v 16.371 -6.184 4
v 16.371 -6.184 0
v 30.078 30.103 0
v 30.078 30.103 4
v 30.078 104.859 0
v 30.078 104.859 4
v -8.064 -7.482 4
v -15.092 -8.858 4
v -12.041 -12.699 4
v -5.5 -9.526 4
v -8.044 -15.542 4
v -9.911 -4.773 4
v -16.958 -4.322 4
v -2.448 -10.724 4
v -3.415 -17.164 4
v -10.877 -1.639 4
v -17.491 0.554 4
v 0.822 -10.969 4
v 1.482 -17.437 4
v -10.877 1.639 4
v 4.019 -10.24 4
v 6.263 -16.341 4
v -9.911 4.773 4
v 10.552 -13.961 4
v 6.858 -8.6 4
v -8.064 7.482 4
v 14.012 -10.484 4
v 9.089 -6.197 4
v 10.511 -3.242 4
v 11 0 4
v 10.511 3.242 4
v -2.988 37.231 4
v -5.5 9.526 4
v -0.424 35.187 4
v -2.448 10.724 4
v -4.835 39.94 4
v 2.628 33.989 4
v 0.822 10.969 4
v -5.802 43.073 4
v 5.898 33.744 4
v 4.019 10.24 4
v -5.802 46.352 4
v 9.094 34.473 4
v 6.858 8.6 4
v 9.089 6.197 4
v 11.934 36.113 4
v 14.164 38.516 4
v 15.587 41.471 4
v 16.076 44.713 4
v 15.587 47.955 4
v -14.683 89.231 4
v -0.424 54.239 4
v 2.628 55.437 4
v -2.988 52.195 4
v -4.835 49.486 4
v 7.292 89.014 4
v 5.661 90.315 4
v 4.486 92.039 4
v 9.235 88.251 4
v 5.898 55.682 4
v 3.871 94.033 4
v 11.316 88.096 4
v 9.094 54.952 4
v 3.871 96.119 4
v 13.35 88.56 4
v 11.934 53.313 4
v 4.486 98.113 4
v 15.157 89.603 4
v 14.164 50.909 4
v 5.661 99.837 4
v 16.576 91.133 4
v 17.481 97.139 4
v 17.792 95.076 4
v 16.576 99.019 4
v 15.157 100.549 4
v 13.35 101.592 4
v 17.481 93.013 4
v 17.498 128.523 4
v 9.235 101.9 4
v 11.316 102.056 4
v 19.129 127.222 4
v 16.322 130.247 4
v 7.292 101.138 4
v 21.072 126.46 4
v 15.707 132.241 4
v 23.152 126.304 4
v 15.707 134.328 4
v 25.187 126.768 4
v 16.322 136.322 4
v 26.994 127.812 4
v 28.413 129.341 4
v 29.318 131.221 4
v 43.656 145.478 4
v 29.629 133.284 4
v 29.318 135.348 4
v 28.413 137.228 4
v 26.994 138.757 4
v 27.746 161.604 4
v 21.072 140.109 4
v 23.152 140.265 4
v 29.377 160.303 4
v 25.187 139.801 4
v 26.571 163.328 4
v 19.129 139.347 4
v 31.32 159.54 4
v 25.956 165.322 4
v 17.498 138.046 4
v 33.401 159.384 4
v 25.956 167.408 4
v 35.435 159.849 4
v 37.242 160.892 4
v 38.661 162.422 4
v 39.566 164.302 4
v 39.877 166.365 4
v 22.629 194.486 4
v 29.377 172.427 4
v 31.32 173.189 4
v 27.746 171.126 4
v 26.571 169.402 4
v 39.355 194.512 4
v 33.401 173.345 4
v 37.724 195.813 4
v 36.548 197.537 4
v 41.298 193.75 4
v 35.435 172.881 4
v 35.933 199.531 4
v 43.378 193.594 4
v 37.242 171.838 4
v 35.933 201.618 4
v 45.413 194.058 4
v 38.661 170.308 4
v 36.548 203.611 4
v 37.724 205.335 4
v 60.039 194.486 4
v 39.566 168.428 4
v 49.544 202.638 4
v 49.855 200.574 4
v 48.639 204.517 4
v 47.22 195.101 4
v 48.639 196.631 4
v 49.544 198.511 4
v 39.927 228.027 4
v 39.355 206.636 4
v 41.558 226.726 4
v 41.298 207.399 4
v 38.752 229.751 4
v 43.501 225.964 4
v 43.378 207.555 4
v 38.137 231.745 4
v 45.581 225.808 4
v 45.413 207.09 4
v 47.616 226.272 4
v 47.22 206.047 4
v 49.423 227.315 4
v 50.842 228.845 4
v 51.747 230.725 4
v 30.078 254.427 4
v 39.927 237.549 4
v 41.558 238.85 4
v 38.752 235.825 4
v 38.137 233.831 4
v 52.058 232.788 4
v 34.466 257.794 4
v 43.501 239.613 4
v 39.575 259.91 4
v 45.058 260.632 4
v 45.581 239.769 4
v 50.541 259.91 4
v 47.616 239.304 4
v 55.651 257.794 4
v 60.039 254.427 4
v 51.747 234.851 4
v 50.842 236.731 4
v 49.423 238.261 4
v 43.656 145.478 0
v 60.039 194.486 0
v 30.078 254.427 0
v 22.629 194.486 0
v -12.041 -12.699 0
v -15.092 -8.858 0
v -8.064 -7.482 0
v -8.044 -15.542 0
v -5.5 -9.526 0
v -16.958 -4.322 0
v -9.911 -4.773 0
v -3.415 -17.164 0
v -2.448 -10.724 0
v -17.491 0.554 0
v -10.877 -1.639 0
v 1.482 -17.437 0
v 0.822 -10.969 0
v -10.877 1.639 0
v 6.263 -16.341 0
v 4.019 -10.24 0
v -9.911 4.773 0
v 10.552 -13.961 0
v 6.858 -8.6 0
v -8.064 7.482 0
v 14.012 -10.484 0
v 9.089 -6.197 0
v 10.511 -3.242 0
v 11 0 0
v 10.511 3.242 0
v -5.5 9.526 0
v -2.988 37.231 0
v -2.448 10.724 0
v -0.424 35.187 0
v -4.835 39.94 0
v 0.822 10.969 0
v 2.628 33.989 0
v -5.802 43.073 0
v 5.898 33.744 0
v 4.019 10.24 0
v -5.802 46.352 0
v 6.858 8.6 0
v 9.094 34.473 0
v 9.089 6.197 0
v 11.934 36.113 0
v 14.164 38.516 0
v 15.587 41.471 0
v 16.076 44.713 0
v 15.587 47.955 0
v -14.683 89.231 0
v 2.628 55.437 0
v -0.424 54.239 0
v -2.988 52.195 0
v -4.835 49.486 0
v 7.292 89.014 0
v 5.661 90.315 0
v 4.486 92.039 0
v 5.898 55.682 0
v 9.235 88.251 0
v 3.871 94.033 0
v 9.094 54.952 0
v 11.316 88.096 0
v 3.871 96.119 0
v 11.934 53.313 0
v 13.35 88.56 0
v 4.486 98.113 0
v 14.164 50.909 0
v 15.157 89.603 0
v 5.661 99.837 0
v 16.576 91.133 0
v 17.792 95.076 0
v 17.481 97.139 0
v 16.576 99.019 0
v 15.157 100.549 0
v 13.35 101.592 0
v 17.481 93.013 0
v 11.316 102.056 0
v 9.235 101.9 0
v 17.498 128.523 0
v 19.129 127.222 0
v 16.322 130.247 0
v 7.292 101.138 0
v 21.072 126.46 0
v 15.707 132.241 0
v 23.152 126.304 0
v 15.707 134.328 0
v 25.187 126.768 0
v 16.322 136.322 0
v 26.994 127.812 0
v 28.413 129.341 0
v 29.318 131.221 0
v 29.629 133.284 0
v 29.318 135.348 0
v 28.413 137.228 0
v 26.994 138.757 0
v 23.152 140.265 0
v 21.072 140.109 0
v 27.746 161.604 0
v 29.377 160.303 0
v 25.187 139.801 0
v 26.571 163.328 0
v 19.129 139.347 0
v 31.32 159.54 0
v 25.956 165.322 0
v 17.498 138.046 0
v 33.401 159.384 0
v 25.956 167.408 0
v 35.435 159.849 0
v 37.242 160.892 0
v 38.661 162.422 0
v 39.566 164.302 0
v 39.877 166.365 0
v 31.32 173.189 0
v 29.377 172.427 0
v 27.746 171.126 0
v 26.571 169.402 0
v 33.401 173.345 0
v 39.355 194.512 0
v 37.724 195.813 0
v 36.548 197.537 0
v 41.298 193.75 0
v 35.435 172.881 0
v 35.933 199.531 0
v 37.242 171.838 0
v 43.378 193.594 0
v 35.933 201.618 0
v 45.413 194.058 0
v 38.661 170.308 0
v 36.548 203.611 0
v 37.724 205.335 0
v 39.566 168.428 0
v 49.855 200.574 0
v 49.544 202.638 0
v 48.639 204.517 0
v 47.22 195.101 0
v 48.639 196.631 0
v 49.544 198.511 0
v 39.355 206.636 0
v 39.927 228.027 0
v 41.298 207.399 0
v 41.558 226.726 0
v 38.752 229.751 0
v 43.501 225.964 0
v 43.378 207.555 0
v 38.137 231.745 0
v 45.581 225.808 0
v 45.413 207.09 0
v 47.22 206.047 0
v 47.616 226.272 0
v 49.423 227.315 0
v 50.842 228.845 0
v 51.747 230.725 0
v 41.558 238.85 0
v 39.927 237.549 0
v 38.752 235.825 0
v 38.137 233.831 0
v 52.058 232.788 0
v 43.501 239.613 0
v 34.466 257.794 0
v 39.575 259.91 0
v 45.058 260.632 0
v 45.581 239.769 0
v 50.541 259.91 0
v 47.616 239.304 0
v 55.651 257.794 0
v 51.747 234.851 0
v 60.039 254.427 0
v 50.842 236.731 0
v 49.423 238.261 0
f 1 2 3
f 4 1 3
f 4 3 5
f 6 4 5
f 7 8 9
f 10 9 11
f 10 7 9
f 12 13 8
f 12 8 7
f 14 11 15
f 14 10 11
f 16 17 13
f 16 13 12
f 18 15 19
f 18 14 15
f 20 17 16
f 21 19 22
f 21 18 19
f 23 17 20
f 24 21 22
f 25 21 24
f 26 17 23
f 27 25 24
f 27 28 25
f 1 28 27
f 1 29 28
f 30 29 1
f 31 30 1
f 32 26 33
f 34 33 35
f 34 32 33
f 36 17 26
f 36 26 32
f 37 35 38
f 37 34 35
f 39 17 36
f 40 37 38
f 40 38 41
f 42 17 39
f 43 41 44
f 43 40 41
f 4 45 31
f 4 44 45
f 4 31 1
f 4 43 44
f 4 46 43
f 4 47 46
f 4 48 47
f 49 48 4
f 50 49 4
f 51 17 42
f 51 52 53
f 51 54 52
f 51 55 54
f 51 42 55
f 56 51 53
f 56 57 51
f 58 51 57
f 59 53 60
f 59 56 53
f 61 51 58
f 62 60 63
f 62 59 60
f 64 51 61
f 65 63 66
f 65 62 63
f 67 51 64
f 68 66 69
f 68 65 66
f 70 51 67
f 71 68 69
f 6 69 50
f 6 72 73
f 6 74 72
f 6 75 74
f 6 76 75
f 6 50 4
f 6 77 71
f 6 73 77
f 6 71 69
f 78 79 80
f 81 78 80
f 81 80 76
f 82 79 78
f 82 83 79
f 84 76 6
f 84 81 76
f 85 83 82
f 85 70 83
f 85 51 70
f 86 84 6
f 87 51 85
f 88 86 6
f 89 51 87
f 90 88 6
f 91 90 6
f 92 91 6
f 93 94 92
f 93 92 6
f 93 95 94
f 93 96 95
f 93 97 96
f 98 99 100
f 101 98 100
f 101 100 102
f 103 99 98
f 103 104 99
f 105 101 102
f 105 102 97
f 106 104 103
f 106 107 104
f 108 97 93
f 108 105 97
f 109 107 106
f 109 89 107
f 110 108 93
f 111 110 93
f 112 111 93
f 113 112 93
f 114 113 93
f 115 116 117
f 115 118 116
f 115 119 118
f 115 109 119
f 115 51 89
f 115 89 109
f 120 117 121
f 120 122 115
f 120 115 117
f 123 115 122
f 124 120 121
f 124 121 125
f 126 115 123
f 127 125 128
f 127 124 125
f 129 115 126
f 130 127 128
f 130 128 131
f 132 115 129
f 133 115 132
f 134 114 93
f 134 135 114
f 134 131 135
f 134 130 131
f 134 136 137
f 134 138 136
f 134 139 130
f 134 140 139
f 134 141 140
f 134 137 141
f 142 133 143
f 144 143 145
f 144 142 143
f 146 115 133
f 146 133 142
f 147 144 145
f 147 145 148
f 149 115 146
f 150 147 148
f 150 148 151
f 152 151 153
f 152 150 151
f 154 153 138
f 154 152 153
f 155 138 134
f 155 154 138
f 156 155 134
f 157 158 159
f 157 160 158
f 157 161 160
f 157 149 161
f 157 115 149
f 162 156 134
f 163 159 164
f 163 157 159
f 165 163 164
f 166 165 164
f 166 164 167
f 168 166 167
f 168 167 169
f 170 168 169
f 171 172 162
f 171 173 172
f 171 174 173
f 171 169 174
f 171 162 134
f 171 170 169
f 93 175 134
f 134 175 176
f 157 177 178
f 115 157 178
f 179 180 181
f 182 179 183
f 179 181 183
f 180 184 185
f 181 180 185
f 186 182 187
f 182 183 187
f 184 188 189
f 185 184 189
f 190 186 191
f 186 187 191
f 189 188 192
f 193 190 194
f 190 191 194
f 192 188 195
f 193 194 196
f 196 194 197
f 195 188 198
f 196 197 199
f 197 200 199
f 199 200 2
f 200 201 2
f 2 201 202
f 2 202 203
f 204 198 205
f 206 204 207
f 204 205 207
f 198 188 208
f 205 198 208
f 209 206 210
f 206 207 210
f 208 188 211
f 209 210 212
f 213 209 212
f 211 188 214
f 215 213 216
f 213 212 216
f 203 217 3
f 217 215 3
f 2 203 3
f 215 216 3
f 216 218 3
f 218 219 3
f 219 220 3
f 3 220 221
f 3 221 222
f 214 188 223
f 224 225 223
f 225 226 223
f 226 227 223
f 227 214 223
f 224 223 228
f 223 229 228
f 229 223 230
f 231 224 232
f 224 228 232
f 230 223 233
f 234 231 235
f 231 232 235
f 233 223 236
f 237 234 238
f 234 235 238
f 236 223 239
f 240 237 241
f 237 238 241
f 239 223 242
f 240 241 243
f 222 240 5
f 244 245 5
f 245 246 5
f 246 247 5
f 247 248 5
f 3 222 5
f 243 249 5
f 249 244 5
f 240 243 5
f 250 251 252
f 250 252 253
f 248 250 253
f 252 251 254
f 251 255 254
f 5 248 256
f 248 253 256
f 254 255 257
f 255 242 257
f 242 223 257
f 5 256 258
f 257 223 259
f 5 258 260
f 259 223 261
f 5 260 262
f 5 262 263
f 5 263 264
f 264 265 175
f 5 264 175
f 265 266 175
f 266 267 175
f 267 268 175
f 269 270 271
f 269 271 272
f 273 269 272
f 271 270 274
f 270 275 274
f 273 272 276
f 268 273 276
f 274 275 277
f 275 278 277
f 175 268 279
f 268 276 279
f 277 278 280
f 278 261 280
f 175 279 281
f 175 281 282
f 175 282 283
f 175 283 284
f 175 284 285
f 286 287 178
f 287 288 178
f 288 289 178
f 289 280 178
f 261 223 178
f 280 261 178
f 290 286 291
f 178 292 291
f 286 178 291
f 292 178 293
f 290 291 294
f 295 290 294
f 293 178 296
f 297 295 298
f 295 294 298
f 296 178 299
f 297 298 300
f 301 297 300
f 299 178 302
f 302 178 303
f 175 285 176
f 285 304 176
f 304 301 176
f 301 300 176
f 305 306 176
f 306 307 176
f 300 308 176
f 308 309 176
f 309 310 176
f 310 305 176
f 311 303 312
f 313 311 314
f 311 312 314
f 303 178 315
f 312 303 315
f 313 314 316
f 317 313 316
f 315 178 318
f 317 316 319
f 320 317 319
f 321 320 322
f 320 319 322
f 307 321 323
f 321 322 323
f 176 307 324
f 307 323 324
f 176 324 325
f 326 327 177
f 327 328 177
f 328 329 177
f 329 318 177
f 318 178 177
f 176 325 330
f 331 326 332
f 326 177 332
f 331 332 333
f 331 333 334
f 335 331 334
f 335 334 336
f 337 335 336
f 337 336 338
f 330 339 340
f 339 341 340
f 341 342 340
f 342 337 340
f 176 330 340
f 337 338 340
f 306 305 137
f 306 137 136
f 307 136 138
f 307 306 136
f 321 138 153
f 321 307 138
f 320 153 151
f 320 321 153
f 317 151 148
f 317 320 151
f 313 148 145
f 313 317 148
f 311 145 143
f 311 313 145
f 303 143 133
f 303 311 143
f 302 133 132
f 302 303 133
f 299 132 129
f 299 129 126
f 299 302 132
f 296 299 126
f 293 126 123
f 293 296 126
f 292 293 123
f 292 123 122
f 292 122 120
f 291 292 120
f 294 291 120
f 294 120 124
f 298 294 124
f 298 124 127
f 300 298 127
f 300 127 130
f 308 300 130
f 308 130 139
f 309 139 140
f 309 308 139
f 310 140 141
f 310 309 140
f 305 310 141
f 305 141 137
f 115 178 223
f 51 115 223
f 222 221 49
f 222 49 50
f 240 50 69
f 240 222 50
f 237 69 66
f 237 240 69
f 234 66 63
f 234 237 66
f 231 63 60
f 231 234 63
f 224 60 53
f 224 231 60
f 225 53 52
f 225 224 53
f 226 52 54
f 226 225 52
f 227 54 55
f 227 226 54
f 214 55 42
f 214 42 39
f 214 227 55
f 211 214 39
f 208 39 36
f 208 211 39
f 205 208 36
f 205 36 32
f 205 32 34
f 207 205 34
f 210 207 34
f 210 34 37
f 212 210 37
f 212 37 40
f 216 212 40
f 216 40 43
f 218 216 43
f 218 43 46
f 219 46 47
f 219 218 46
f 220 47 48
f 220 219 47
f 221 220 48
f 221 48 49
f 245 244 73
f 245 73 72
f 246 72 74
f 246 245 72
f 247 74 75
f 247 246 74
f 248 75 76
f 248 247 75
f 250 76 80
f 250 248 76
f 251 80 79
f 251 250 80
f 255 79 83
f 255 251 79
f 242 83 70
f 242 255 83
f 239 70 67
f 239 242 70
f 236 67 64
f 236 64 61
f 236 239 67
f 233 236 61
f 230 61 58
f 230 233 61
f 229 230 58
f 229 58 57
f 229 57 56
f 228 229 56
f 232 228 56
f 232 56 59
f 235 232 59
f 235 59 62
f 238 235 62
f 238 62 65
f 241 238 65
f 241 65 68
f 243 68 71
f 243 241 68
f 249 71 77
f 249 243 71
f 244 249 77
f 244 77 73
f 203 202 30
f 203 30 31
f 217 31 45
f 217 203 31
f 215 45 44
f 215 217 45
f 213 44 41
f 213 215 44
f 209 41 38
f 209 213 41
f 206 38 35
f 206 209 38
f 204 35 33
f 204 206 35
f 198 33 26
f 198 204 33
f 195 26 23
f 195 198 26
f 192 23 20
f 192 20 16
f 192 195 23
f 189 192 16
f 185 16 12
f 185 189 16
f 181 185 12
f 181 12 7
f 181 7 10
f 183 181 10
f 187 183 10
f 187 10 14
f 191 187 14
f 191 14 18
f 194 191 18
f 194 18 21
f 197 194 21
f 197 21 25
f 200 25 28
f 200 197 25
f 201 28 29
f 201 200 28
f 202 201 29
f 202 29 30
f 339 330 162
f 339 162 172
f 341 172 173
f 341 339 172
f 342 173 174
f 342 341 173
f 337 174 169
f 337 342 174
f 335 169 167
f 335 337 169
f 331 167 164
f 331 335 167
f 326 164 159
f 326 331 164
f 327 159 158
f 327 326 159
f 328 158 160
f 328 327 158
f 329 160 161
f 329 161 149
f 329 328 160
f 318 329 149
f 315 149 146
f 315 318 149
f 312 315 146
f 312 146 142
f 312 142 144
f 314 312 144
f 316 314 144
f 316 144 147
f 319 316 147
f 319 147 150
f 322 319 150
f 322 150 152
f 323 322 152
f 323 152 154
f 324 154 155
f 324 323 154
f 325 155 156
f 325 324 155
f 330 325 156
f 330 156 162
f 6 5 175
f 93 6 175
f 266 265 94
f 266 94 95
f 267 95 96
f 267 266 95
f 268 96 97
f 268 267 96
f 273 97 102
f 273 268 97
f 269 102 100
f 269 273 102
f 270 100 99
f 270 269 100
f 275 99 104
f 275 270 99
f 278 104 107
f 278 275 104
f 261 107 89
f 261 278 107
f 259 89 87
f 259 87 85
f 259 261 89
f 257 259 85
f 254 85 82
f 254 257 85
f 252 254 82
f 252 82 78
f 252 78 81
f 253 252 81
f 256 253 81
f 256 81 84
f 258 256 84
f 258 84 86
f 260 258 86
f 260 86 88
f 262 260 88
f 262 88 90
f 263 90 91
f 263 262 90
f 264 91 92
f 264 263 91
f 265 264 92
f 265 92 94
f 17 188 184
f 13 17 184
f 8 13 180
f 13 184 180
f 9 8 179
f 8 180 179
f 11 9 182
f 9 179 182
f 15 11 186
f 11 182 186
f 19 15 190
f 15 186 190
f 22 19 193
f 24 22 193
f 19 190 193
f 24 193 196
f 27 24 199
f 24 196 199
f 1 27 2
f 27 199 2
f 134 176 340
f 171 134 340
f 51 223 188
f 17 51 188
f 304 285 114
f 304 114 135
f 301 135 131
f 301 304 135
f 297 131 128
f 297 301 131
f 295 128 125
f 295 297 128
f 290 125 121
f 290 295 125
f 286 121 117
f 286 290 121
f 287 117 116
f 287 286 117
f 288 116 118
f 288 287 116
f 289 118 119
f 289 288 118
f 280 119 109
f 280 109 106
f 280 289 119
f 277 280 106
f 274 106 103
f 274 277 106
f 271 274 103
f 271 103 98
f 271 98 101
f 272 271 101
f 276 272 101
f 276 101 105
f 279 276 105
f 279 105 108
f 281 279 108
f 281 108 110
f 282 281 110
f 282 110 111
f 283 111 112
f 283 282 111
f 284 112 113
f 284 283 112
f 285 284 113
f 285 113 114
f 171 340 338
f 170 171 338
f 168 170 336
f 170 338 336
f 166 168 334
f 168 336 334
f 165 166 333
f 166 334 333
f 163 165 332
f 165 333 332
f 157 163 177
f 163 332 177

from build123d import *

# Parameters (mm, degrees)
SKETCH2_R           = 11
SKETCH2_R_2         = 7
BOSS_EXTRUDE1_DEPTH = 4


with BuildPart() as part:
    # Sketch2 → Boss-Extrude1 (new body)
    with BuildSketch(Plane.XY):
        with BuildLine():
            Line((30.078103468, 30.102899094), (30.078103468, 104.858637586))
            Line((30.078103468, 104.858637586), (43.656234688, 145.478166756))
            Line((43.656234688, 145.478166756), (60.038536544, 194.486485935))
            Line((60.038536544, 194.486485935), (60.038536544, 254.427096014))
            ThreePointArc((60.038536544, 254.427096014), (45.05832001, 260.632104877), (30.078103469, 254.427096029))
            Line((30.078103469, 254.427096029), (22.62926434, 194.486485916))
            Line((22.62926434, 194.486485916), (-14.683335653, 89.230795609))
            Line((-14.683335653, 89.230795609), (-17.49123357, 0.553848547))
            ThreePointArc((-17.49123357, 0.553848547), (-3.415184823, -17.163522734), (16.370945819, -6.184022397))
            Line((16.370945819, -6.184022397), (30.078103468, 30.102899094))
        make_face()
        Circle(SKETCH2_R, mode=Mode.SUBTRACT)
        with Locations((45.058319997, 232.788133995)):
            Circle(SKETCH2_R_2, mode=Mode.SUBTRACT)
        with Locations((42.85515341, 200.574247039)):
            Circle(SKETCH2_R_2, mode=Mode.SUBTRACT)
        with Locations((32.877400798, 166.36480954)):
            Circle(SKETCH2_R_2, mode=Mode.SUBTRACT)
        with Locations((22.629264347, 133.284451418)):
            Circle(SKETCH2_R_2, mode=Mode.SUBTRACT)
        with Locations((10.792452444, 95.075946031)):
            Circle(SKETCH2_R_2, mode=Mode.SUBTRACT)
        with Locations((5.075535148, 44.712849864)):
            Circle(SKETCH2_R, mode=Mode.SUBTRACT)
    extrude(amount=BOSS_EXTRUDE1_DEPTH)


solid = part.part
